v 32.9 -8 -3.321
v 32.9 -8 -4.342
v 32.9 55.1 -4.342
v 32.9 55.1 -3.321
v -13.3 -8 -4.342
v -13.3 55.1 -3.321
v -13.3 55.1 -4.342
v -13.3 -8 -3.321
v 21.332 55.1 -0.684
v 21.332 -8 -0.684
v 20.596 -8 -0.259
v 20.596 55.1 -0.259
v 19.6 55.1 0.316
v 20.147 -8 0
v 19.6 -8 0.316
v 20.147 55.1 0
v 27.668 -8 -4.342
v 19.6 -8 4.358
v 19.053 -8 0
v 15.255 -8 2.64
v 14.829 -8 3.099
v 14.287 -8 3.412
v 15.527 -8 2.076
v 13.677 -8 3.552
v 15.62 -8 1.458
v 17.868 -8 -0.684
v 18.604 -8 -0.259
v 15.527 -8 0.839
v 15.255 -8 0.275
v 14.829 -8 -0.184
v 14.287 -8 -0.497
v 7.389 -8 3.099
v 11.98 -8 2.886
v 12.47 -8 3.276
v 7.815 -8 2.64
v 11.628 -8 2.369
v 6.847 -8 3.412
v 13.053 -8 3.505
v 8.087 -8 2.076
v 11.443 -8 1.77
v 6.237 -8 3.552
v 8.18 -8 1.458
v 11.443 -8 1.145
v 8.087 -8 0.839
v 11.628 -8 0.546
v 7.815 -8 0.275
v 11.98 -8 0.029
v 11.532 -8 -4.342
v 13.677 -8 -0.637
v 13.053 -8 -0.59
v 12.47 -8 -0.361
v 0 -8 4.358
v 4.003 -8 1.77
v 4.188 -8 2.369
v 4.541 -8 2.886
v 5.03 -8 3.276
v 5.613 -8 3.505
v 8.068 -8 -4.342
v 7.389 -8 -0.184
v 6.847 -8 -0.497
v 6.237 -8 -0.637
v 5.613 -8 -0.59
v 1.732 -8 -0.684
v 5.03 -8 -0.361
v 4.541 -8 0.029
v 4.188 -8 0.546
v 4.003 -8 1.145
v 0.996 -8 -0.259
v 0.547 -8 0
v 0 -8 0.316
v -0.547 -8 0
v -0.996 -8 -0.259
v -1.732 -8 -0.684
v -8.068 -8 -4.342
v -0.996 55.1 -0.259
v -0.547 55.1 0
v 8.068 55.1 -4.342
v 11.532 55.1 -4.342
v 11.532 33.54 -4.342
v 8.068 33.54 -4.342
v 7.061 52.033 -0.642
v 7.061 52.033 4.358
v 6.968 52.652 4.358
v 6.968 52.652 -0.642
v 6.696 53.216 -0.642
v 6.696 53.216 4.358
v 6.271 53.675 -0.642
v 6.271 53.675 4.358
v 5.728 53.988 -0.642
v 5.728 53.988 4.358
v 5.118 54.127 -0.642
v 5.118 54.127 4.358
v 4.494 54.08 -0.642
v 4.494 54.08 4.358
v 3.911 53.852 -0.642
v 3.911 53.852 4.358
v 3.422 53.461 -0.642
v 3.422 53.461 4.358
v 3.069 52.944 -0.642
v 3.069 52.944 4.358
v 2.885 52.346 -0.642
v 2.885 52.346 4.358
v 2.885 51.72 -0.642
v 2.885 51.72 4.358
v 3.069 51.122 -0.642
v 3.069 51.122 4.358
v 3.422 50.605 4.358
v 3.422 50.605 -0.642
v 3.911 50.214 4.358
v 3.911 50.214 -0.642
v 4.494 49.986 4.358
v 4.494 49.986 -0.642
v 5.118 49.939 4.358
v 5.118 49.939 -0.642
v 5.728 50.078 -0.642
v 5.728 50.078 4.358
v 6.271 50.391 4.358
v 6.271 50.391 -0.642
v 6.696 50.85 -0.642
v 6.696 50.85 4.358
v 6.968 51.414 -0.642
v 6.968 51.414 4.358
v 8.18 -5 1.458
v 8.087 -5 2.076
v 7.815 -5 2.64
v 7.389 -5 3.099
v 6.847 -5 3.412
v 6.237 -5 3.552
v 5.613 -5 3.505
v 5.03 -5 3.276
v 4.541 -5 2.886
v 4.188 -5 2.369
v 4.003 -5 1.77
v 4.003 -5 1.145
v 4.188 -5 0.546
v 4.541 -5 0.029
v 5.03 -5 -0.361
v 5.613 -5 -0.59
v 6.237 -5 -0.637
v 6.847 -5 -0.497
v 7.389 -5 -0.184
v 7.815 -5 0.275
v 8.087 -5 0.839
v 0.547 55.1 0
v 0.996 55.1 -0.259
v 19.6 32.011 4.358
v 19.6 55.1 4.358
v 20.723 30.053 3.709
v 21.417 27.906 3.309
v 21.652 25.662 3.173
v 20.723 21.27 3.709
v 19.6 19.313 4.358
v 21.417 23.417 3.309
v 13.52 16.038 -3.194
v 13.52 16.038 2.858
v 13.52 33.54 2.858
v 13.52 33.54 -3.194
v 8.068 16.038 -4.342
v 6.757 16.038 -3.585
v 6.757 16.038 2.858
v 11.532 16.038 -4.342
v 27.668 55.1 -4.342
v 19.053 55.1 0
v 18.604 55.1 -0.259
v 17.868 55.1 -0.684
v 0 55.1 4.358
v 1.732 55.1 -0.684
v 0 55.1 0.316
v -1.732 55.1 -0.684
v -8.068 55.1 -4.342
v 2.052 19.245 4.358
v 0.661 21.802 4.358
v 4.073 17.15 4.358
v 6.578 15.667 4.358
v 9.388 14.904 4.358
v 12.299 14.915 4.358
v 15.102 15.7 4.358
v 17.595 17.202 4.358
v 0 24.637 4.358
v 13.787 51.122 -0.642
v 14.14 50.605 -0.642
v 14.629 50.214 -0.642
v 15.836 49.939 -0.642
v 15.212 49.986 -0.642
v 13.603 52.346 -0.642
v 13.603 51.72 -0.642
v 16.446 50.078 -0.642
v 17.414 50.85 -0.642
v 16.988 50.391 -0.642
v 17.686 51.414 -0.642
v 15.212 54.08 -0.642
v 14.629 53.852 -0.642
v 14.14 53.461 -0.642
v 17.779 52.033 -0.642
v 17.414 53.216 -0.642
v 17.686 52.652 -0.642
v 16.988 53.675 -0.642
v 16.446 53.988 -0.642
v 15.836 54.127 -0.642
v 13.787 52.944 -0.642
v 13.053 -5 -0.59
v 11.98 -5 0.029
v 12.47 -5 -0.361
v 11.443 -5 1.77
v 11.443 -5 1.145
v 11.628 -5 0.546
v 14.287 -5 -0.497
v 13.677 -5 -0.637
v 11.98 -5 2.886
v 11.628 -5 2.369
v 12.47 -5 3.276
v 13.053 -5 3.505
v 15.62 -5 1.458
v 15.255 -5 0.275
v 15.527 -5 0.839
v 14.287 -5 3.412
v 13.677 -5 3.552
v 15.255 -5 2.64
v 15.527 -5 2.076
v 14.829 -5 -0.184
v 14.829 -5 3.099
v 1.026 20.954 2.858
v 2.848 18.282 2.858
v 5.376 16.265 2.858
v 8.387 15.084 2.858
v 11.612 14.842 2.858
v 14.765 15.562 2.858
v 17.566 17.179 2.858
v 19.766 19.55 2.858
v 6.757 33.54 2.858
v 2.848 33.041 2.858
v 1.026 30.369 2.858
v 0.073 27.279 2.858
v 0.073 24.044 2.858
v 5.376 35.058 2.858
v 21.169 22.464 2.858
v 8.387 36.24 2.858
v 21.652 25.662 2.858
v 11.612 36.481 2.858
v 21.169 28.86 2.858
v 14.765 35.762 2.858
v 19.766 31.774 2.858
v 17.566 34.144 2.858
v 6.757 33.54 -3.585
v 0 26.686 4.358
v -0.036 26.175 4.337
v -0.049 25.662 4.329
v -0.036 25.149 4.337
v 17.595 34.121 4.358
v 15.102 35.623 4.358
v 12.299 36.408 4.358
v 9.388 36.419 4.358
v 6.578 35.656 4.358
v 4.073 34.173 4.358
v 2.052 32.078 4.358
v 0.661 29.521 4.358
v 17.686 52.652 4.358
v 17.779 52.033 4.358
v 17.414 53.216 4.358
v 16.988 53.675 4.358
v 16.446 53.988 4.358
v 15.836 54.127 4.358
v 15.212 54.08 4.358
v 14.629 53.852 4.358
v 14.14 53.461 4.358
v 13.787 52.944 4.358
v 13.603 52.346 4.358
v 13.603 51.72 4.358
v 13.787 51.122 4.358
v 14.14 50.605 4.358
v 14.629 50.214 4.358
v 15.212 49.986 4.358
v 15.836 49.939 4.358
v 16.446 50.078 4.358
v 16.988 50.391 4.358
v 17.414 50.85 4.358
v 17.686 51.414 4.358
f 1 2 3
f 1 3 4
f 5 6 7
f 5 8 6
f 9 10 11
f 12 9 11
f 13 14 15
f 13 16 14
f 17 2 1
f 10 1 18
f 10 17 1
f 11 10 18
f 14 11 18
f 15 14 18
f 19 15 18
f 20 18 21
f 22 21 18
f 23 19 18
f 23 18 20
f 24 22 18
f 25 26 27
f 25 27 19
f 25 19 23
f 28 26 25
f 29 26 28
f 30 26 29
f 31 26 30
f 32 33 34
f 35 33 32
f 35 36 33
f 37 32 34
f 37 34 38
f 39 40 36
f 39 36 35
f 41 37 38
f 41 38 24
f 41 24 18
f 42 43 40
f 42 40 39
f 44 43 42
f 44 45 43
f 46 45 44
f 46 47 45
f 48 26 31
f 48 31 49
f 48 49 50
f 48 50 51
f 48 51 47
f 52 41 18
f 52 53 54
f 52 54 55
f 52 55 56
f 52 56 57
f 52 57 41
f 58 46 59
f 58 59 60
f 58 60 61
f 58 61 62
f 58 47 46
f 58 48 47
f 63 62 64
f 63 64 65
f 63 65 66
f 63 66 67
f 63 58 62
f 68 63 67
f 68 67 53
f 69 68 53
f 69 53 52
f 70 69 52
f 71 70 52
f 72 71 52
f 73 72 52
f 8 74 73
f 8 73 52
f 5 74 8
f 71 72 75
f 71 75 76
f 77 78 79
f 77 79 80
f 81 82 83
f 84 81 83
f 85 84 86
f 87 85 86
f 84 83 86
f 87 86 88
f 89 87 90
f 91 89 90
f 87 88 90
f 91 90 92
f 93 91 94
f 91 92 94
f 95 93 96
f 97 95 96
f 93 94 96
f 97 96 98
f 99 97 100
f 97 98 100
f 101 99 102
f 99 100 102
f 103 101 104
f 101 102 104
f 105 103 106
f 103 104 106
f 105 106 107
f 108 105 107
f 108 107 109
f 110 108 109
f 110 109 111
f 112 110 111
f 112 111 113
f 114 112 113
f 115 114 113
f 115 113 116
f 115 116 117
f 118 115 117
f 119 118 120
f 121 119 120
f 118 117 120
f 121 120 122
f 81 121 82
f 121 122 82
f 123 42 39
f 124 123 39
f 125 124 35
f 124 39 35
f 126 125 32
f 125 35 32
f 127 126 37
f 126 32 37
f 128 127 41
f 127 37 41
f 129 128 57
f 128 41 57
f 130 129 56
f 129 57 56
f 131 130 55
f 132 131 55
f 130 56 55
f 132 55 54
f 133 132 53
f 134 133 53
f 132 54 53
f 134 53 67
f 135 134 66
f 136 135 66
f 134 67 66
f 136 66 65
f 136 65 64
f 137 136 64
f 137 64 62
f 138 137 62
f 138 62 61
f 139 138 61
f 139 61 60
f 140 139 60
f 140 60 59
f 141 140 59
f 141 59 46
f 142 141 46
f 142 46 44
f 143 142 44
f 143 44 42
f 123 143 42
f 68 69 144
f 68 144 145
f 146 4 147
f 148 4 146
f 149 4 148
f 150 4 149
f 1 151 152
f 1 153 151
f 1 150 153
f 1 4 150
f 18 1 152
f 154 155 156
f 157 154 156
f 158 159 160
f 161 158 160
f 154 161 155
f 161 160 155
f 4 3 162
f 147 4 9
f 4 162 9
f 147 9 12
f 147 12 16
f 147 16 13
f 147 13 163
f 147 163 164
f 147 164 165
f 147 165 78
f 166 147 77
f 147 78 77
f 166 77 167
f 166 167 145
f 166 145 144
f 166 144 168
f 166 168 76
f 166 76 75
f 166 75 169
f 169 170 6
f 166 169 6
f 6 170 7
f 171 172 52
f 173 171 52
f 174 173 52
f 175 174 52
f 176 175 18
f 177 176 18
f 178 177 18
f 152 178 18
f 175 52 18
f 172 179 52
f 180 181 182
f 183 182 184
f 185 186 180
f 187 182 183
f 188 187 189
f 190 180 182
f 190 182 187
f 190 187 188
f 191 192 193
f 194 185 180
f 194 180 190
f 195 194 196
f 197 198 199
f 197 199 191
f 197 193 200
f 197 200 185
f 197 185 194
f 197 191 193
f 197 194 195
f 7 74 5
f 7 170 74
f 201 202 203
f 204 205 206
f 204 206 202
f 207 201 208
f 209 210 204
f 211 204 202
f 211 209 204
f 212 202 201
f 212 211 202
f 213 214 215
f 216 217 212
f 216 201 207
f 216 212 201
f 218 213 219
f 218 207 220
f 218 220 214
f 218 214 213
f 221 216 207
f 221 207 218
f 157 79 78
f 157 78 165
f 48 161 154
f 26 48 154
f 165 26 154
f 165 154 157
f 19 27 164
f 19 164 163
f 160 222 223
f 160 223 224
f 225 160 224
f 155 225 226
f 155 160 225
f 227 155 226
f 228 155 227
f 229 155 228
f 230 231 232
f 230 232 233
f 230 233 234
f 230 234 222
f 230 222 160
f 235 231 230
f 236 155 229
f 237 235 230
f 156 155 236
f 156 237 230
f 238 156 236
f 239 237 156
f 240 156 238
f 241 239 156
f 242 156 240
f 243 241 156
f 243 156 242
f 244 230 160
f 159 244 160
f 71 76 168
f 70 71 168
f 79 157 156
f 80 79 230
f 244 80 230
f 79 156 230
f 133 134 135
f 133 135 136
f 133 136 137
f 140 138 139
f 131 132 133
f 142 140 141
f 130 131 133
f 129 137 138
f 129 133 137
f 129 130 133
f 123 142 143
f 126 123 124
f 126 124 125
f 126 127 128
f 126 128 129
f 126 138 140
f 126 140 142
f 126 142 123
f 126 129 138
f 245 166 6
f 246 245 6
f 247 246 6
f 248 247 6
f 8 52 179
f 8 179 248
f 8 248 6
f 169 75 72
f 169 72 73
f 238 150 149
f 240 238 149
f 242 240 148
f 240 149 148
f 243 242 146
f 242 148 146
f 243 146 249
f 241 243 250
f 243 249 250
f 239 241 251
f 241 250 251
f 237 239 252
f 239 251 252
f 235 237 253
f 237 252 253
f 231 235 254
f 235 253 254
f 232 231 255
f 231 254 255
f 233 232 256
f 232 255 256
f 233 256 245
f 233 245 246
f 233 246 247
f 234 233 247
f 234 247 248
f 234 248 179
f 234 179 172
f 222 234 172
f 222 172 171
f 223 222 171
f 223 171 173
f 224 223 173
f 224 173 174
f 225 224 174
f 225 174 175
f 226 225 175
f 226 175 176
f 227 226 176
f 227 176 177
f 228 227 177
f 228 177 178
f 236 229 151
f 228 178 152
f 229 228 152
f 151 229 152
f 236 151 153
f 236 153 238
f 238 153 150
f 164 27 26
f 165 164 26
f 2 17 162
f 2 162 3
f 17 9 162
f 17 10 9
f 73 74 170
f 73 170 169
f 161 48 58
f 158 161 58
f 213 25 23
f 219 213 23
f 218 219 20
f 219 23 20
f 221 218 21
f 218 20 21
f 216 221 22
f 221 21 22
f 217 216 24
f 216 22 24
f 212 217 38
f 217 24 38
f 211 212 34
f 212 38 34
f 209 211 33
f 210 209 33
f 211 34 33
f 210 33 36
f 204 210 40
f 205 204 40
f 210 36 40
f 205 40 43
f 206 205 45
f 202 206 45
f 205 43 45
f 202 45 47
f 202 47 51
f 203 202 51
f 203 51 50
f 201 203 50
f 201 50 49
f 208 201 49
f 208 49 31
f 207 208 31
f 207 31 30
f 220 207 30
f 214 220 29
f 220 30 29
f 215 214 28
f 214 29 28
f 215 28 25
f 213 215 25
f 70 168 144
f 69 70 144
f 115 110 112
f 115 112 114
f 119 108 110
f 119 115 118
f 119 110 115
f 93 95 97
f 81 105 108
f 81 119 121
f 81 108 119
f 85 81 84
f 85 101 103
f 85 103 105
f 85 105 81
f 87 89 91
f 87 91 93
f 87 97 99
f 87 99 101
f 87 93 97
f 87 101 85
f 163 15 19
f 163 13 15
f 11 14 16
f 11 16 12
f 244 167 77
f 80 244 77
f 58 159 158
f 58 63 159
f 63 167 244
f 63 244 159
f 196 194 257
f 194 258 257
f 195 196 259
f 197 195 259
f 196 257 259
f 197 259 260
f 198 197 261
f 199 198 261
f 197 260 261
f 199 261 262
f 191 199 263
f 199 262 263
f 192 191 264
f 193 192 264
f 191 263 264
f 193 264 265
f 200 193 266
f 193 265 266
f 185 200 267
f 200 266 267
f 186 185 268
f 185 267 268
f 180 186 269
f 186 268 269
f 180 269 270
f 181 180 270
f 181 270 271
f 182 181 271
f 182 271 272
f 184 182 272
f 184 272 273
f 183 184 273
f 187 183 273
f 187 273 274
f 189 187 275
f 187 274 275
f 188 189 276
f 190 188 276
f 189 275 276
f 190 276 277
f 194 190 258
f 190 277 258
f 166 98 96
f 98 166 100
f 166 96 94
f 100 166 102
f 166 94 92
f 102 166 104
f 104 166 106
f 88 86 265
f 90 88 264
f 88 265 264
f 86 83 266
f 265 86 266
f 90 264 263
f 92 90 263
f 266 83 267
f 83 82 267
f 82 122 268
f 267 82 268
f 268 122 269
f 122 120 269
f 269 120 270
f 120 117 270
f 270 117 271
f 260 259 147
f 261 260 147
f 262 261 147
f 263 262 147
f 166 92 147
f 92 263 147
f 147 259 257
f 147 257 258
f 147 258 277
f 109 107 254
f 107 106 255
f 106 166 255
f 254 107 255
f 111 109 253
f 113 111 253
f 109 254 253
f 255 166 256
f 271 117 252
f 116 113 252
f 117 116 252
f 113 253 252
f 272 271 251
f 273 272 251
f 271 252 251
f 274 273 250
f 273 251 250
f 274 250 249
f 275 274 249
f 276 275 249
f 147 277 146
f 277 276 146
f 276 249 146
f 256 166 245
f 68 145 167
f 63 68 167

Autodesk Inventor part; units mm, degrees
ref_plane "YZ Plane" through (0, 0, 0) normal (1, 0, 0) x (0, 1, 0)
ref_plane "XZ Plane" through (0, 0, 0) normal (0, 1, 0) x (-1, 0, 0)
ref_plane "РабПлоскость1" through (19.6, -8, -11) normal (0, -1, 0) x (-1, 0, 0)
sketch "Эскиз1" plane through (19.6, -8, -11) normal (0, -1, 0) x (-1, 0, 0)
  line L0 (29.4, -5.9741) -> (29.4, 5.9741) projected
  line L1 (28.2551, 5.9741) -> (29.4, 5.9741) projected
  line L2 (28.65, 6.658) -> (28.2551, 5.9741) projected
  line L3 (27.6679, 6.658) -> (28.65, 6.658) projected
  line L4 (21.3321, 10.3161) -> (27.6679, 6.658) projected
  line L5 (21.3321, 10.3161) -> (20.35, 10.3161) projected
  line L6 (20.35, 10.3161) -> (20.5955, 10.7413) projected
  line L7 (20.1474, 11) -> (20.5955, 10.7413) projected
  line L8 (20.1474, 11) -> (19.0526, 11) projected
  line L9 (18.6045, 10.7413) -> (19.0526, 11) projected
  line L10 (18.85, 10.3161) -> (18.6045, 10.7413) projected
  line L11 (17.8679, 10.3161) -> (18.85, 10.3161) projected
  line L12 (11.5321, 6.658) -> (17.8679, 10.3161) projected
  line L13 (11.5321, 6.658) -> (10.55, 6.658) projected
  line L14 (10.55, 6.658) -> (10.9449, 5.9741) projected
  line L15 (8.6551, 5.9741) -> (10.9449, 5.9741) projected
  line L16 (9.05, 6.658) -> (8.6551, 5.9741) projected
  line L17 (8.0679, 6.658) -> (9.05, 6.658) projected
  line L18 (1.7321, 10.3161) -> (8.0679, 6.658) projected
  line L19 (1.7321, 10.3161) -> (0.75, 10.3161) projected
  line L20 (0.75, 10.3161) -> (0.9955, 10.7413) projected
  line L21 (0.5474, 11) -> (0.9955, 10.7413) projected
  line L22 (-0.5474, 11) -> (0.5474, 11) projected
  line L23 (-0.9955, 10.7413) -> (-0.5474, 11) projected
  line L24 (-0.75, 10.3161) -> (-0.9955, 10.7413) projected
  line L25 (-1.7321, 10.3161) -> (-0.75, 10.3161) projected
  line L26 (-8.0679, 6.658) -> (-1.7321, 10.3161) projected
  line L27 (-8.0679, 6.658) -> (-9.05, 6.658) projected
  line L28 (-9.05, 6.658) -> (-8.6551, 5.9741) projected
  line L29 (-8.6551, 5.9741) -> (-9.8, 5.9741) projected
  line L30 (-9.8, -5.9741) -> (-9.8, 5.9741) projected
  line L31 (-8.6551, -5.9741) -> (-9.8, -5.9741) projected
  line L32 (-9.05, -6.658) -> (-8.6551, -5.9741) projected
  line L33 (-8.0679, -6.658) -> (-9.05, -6.658) projected
  line L34 (-1.7321, -10.3161) -> (-8.0679, -6.658) projected
  line L35 (-1.7321, -10.3161) -> (-0.75, -10.3161) projected
  line L36 (-0.75, -10.3161) -> (-0.9955, -10.7413) projected
  line L37 (-0.5474, -11) -> (-0.9955, -10.7413) projected
  line L38 (-0.5474, -11) -> (0.5474, -11) projected
  line L39 (0.9955, -10.7413) -> (0.5474, -11) projected
  line L40 (0.75, -10.3161) -> (0.9955, -10.7413) projected
  line L41 (1.7321, -10.3161) -> (0.75, -10.3161) projected
  line L42 (8.0679, -6.658) -> (1.7321, -10.3161) projected
  line L43 (8.0679, -6.658) -> (9.05, -6.658) projected
  line L44 (9.05, -6.658) -> (8.6551, -5.9741) projected
  line L45 (8.6551, -5.9741) -> (10.9449, -5.9741) projected
  line L46 (10.55, -6.658) -> (10.9449, -5.9741) projected
  line L47 (11.5321, -6.658) -> (10.55, -6.658) projected
  line L48 (17.8679, -10.3161) -> (11.5321, -6.658) projected
  line L49 (17.8679, -10.3161) -> (18.85, -10.3161) projected
  line L50 (18.85, -10.3161) -> (18.6045, -10.7413) projected
  line L51 (19.0526, -11) -> (18.6045, -10.7413) projected
  line L52 (19.0526, -11) -> (20.1474, -11) projected
  line L53 (20.5955, -10.7413) -> (20.1474, -11) projected
  line L54 (20.35, -10.3161) -> (20.5955, -10.7413) projected
  line L55 (21.3321, -10.3161) -> (20.35, -10.3161) projected
  line L56 (27.6679, -6.658) -> (21.3321, -10.3161) projected
  line L57 (27.6679, -6.658) -> (28.65, -6.658) projected
  line L58 (28.65, -6.658) -> (28.2551, -5.9741) projected
  line L59 (28.2551, -5.9741) -> (29.4, -5.9741) projected
  circle A0 centre (0, 0) radius 8.1 projected
  circle A1 centre (19.6, 0) radius 8.1 projected
  line L60 (32.9, 3.6373) -> (42.7, 9.2953) projected
  line L61 (42.7, 9.2953) -> (42.7, 24.6529) projected
  line L62 (42.7, 24.6529) -> (29.4, 32.3316) projected
  line L63 (29.4, 32.3316) -> (19.6, 26.6736) projected
  line L64 (19.6, 26.6736) -> (9.8, 32.3316) projected
  line L65 (9.8, 32.3316) -> (0, 26.6736) projected
  line L66 (0, 26.6736) -> (-9.8, 32.3316) projected
  line L67 (-9.8, 32.3316) -> (-23.1, 24.6529) projected
  line L68 (-23.1, 24.6529) -> (-23.1, 9.2953) projected
  line L69 (-23.1, 9.2953) -> (-13.3, 3.6373) projected
  line L70 (-13.3, 3.6373) -> (-13.3, -7.6788) projected
  line L71 (29.4, -5.9741) -> (28.2551, -5.9741) projected
  line L72 (28.2551, -5.9741) -> (28.65, -6.658) projected
  line L73 (28.65, -6.658) -> (27.6679, -6.658) projected
  line L74 (27.6679, -6.658) -> (21.3321, -10.3161) projected
  line L75 (17.8679, -10.3161) -> (11.5321, -6.658) projected
  line L76 (11.5321, -6.658) -> (10.55, -6.658) projected
  line L77 (10.55, -6.658) -> (10.9449, -5.9741) projected
  line L78 (10.9449, -5.9741) -> (8.6551, -5.9741) projected
  line L79 (8.6551, -5.9741) -> (9.05, -6.658) projected
  line L80 (9.05, -6.658) -> (8.0679, -6.658) projected
  line L81 (8.0679, -6.658) -> (1.7321, -10.3161) projected
  line L82 (-1.7321, -10.3161) -> (-8.0679, -6.658) projected
  line L83 (-8.0679, -6.658) -> (-9.05, -6.658) projected
  line L84 (-9.05, -6.658) -> (-8.6551, -5.9741) projected
  line L85 (-8.6551, -5.9741) -> (-9.8, -5.9741) projected
  line L86 (-9.8, -5.9741) -> (-9.8, 5.9741) projected
  line L87 (-9.8, 5.9741) -> (-10.3474, 5.9741) projected
  line L88 (-10.3474, 5.9741) -> (-10.7955, 6.2328) projected
  line L89 (-10.7955, 6.2328) -> (-10.55, 6.658) projected
  line L90 (-10.55, 6.658) -> (-11.5321, 6.658) projected
  line L91 (-11.5321, 6.658) -> (-17.8679, 10.3161) projected
  line L92 (-17.8679, 10.3161) -> (-18.85, 10.3161) projected
  line L93 (-18.85, 10.3161) -> (-18.4551, 11) projected
  line L94 (-18.4551, 11) -> (-19.6, 11) projected
  line L95 (-19.6, 11) -> (-19.6, 22.9482) projected
  line L96 (-19.6, 22.9482) -> (-18.4551, 22.9482) projected
  line L97 (-18.4551, 22.9482) -> (-18.85, 23.6321) projected
  line L98 (-18.85, 23.6321) -> (-17.8679, 23.6321) projected
  line L99 (-17.8679, 23.6321) -> (-11.5321, 27.2902) projected
  line L100 (-11.5321, 27.2902) -> (-10.55, 27.2902) projected
  line L101 (-10.55, 27.2902) -> (-10.7955, 27.7154) projected
  line L102 (-10.7955, 27.7154) -> (-10.3474, 27.9741) projected
  line L103 (-10.3474, 27.9741) -> (-9.2526, 27.9741) projected
  line L104 (-9.2526, 27.9741) -> (-8.8045, 27.7154) projected
  line L105 (-8.8045, 27.7154) -> (-9.05, 27.2902) projected
  line L106 (-9.05, 27.2902) -> (-8.0679, 27.2902) projected
  line L107 (-8.0679, 27.2902) -> (-1.7321, 23.6321) projected
  line L108 (-1.7321, 23.6321) -> (-0.75, 23.6321) projected
  line L109 (-0.75, 23.6321) -> (-1.1449, 22.9482) projected
  line L110 (-1.1449, 22.9482) -> (1.1449, 22.9482) projected
  line L111 (1.1449, 22.9482) -> (0.75, 23.6321) projected
  line L112 (0.75, 23.6321) -> (1.7321, 23.6321) projected
  line L113 (1.7321, 23.6321) -> (8.0679, 27.2902) projected
  line L114 (8.0679, 27.2902) -> (9.05, 27.2902) projected
  line L115 (9.05, 27.2902) -> (8.8045, 27.7154) projected
  line L116 (8.8045, 27.7154) -> (9.2526, 27.9741) projected
  line L117 (9.2526, 27.9741) -> (10.3474, 27.9741) projected
  line L118 (10.3474, 27.9741) -> (10.7955, 27.7154) projected
  line L119 (10.7955, 27.7154) -> (10.55, 27.2902) projected
  line L120 (10.55, 27.2902) -> (11.5321, 27.2902) projected
  line L121 (11.5321, 27.2902) -> (17.8679, 23.6321) projected
  line L122 (17.8679, 23.6321) -> (18.85, 23.6321) projected
  line L123 (18.85, 23.6321) -> (18.4551, 22.9482) projected
  line L124 (18.4551, 22.9482) -> (20.7449, 22.9482) projected
  line L125 (20.7449, 22.9482) -> (20.35, 23.6321) projected
  line L126 (20.35, 23.6321) -> (21.3321, 23.6321) projected
  line L127 (21.3321, 23.6321) -> (27.6679, 27.2902) projected
  line L128 (27.6679, 27.2902) -> (28.65, 27.2902) projected
  line L129 (28.65, 27.2902) -> (28.4045, 27.7154) projected
  line L130 (28.4045, 27.7154) -> (28.8526, 27.9741) projected
  line L131 (28.8526, 27.9741) -> (29.9474, 27.9741) projected
  line L132 (29.9474, 27.9741) -> (30.3955, 27.7154) projected
  line L133 (30.3955, 27.7154) -> (30.15, 27.2902) projected
  line L134 (30.15, 27.2902) -> (31.1321, 27.2902) projected
  line L135 (31.1321, 27.2902) -> (37.4679, 23.6321) projected
  line L136 (37.4679, 23.6321) -> (38.45, 23.6321) projected
  line L137 (38.45, 23.6321) -> (38.0551, 22.9482) projected
  line L138 (38.0551, 22.9482) -> (39.2, 22.9482) projected
  line L139 (39.2, 22.9482) -> (39.2, 11) projected
  line L140 (39.2, 11) -> (38.0551, 11) projected
  line L141 (38.0551, 11) -> (38.45, 10.3161) projected
  line L142 (38.45, 10.3161) -> (37.4679, 10.3161) projected
  line L143 (37.4679, 10.3161) -> (31.1321, 6.658) projected
  line L144 (31.1321, 6.658) -> (30.15, 6.658) projected
  line L145 (30.15, 6.658) -> (30.3955, 6.2328) projected
  line L146 (30.3955, 6.2328) -> (29.9474, 5.9741) projected
  line L147 (29.9474, 5.9741) -> (29.4, 5.9741) projected
  line L148 (29.4, 5.9741) -> (29.4, -5.9741) projected
  line L149 (-13.3, -7.6788) -> (0, -15.3575) projected
  line L150 (0, -15.3575) -> (9.8, -9.6995) projected
  line L151 (9.8, -9.6995) -> (19.6, -15.3575) projected
  line L152 (19.6, -15.3575) -> (32.9, -7.6788) projected
  line L153 (32.9, -7.6788) -> (32.9, 3.6373) projected
  line L154 (21.3321, -10.3161) -> (20.35, -10.3161) projected
  line L155 (20.35, -10.3161) -> (20.5955, -10.7413) projected
  line L156 (20.5955, -10.7413) -> (20.1474, -11) projected
  line L157 (20.1474, -11) -> (19.0526, -11) projected
  line L158 (19.0526, -11) -> (18.6045, -10.7413) projected
  line L159 (18.6045, -10.7413) -> (18.85, -10.3161) projected
  line L160 (18.85, -10.3161) -> (17.8679, -10.3161) projected
  line L161 (1.7321, -10.3161) -> (0.75, -10.3161) projected
  line L162 (0.75, -10.3161) -> (0.9955, -10.7413) projected
  line L163 (0.9955, -10.7413) -> (0.5474, -11) projected
  line L164 (0.5474, -11) -> (-0.5474, -11) projected
  line L165 (-0.5474, -11) -> (-0.9955, -10.7413) projected
  line L166 (-0.9955, -10.7413) -> (-0.75, -10.3161) projected
  line L167 (-0.75, -10.3161) -> (-1.7321, -10.3161) projected
  line L168 (32.9, -5.9741) -> (29.4, -5.9741)
  line L169 (-9.8, -5.9741) -> (-13.3, -5.9741)
  line L170 (19.6, -15.3575) -> (0, -15.3575)
  point P0 (19.6, -11)
ref_plane "РабПлоскость2" through (-38.0502, 55.1, -60.2624) normal (0, -1, 0) x (1, 0, 0)
extrude "Выдавливание1" add sketch "Эскиз1" against normal up to surface (63.1 mm away) contours L168 L153 L152 L151 L150 L149 L70 L169 L31 L32 L33 L34 L35 L36 L37 L38 L39 L40 L41 L42 L43 L44 L45 L46 L47 L48 L49 L50 L51 L52 L53 L54 L55 L56 L57 L58 L59 | L170 L150 L151
sketch "Эскиз2" plane through (0, -8, 4.3575) normal (0, 0, 1) x (1, 0, 0)
  circle A0 centre (10.0964, 32.8819) radius 10.85 projected
  spline S0 degree 3 poles (1.2199, 29.8332) (1.2264, 29.8391) (1.2399, 29.8514) (1.2666, 29.8618) (1.2971, 29.8679) (1.3188, 29.8674) (1.3303, 29.8671) knots 0 0 0 0 0.219432 0.455746 0.710361 1 1 1 1 projected
  line L0 (1.3303, 29.8671) -> (4.8998, 29.6603) projected
  line L1 (4.8998, 29.6603) -> (4.9412, 30.3747) projected
  spline S1 degree 3 poles (4.9412, 30.3747) (4.9436, 30.3952) (4.948, 30.4343) (4.9731, 30.4645) (4.9851, 30.4789) knots 0 0 0 0 0.523055 1 1 1 1 projected
  spline S2 degree 3 poles (4.9851, 30.4789) (5.0002, 30.4888) (5.0301, 30.5084) (5.0658, 30.5096) (5.0835, 30.5102) knots 0 0 0 0 0.505194 1 1 1 1 projected
  spline S3 degree 3 poles (5.0835, 30.5102) (5.0953, 30.507) (5.1242, 30.4991) (5.1574, 30.4755) (5.186, 30.4505) (5.2006, 30.4236) (5.2097, 30.3936) (5.2095, 30.3722) (5.2093, 30.3609) knots 0 0 0 0 0.170693 0.418909 0.563896 0.700202 0.841955 1 1 1 1 projected
  line L2 (5.2093, 30.3609) -> (5.1108, 28.6607) projected
  spline S4 degree 3 poles (5.1108, 28.6607) (5.1075, 28.6439) (5.1004, 28.6081) (5.064, 28.5657) (5.0204, 28.5312) (4.985, 28.5283) (4.9686, 28.5269) knots 0 0 0 0 0.239185 0.507115 0.772399 1 1 1 1 projected
  spline S5 degree 3 poles (4.9686, 28.5269) (4.9527, 28.5298) (4.9195, 28.5357) (4.8843, 28.5622) (4.8611, 28.5897) (4.8491, 28.6156) (4.842, 28.6452) (4.8426, 28.6661) (4.8429, 28.6771) knots 0 0 0 0 0.219722 0.460095 0.585443 0.71296 0.849405 1 1 1 1 projected
  line L3 (4.8429, 28.6771) -> (4.8843, 29.3923) projected
  line L4 (4.8843, 29.3923) -> (1.3148, 29.5991) projected
  spline S6 degree 3 poles (1.3148, 29.5991) (1.2937, 29.6014) (1.254, 29.6057) (1.2233, 29.6311) (1.2089, 29.6431) knots 0 0 0 0 0.529822 1 1 1 1 projected
  spline S7 degree 3 poles (1.2089, 29.6431) (1.1996, 29.6574) (1.1802, 29.6872) (1.1802, 29.7228) (1.1802, 29.7414) knots 0 0 0 0 0.479535 1 1 1 1 projected
  spline S8 degree 3 poles (1.1802, 29.7414) (1.1812, 29.7464) (1.1836, 29.7582) (1.1913, 29.7787) (1.2037, 29.8042) (1.2142, 29.8229) (1.2199, 29.8332) knots 0 0 0 0 0.152278 0.360896 0.649123 1 1 1 1 projected
  line L5 (5.314, 32.1682) -> (5.2899, 31.752) projected
  spline S9 degree 3 poles (5.2899, 31.752) (5.2876, 31.7272) (5.2829, 31.6758) (5.2703, 31.5966) (5.2484, 31.514) (5.2231, 31.428) (5.1921, 31.3426) (5.1551, 31.2607) (5.1134, 31.1842) (5.0808, 31.137) (5.0647, 31.1138) knots 0 0 0 0 0.109156 0.226197 0.350912 0.483159 0.618823 0.74875 0.876439 1 1 1 1 projected
  spline S10 degree 3 poles (5.0647, 31.1138) (5.0604, 31.1082) (5.0508, 31.0957) (5.0277, 31.0797) (4.9933, 31.0643) (4.9651, 31.0584) (4.9487, 31.055) knots 0 0 0 0 0.157275 0.353812 0.623959 1 1 1 1 projected
  spline S11 degree 3 poles (4.9487, 31.055) (4.931, 31.0577) (4.8944, 31.0635) (4.8502, 31.0969) (4.8148, 31.1372) (4.811, 31.1704) (4.8092, 31.1857) knots 0 0 0 0 0.254223 0.52772 0.782584 1 1 1 1 projected
  line L6 (4.8092, 31.1857) -> (4.839, 31.2655) projected
  spline S12 degree 3 poles (4.839, 31.2655) (4.8649, 31.302) (4.9161, 31.3743) (4.9704, 31.4963) (5.009, 31.625) (5.0173, 31.7147) (5.0215, 31.76) knots 0 0 0 0 0.250207 0.496054 0.745305 1 1 1 1 projected
  line L7 (5.0215, 31.76) -> (5.0462, 32.1871) projected
  spline S13 degree 3 poles (5.0462, 32.1871) (5.0465, 32.2279) (5.047, 32.3069) (5.0221, 32.4217) (4.9727, 32.5253) (4.9041, 32.6172) (4.8204, 32.6936) (4.7258, 32.7518) (4.6219, 32.7904) (4.5485, 32.7982) (4.5113, 32.8021) knots 0 0 0 0 0.134588 0.260434 0.384536 0.51119 0.637382 0.756913 0.876544 1 1 1 1 projected
  line L8 (4.5113, 32.8021) -> (4.3969, 32.8004) projected
  line L9 (4.3969, 32.8004) -> (4.3418, 32.7918) projected
  line L10 (4.3418, 32.7918) -> (4.2895, 32.7747) projected
  spline S14 degree 3 poles (4.2895, 32.7747) (4.2759, 32.7681) (4.2464, 32.7539) (4.201, 32.7264) (4.1502, 32.6923) (4.1153, 32.6662) (4.0967, 32.6522) knots 0 0 0 0 0.198705 0.428492 0.695375 1 1 1 1 projected
  line L11 (4.0967, 32.6522) -> (2.7508, 31.4386) projected
  spline S15 degree 3 poles (2.7508, 31.4386) (2.7287, 31.4196) (2.6853, 31.3821) (2.6147, 31.3335) (2.5398, 31.2938) (2.4871, 31.2738) (2.4608, 31.2638) knots 0 0 0 0 0.25594 0.505009 0.752321 1 1 1 1 projected
  line L12 (2.4608, 31.2638) -> (2.3941, 31.2441) projected
  line L13 (2.3941, 31.2441) -> (2.2844, 31.2219) projected
  line L14 (2.2844, 31.2219) -> (2.2184, 31.214) projected
  line L15 (2.2184, 31.214) -> (2.1355, 31.2188) projected
  spline S16 degree 3 poles (2.1355, 31.2188) (2.1073, 31.221) (2.0518, 31.2253) (1.9706, 31.2414) (1.8929, 31.264) (1.8193, 31.2949) (1.7487, 31.3318) (1.6814, 31.3759) (1.6185, 31.428) (1.5798, 31.4669) (1.5603, 31.4866) knots 0 0 0 0 0.130274 0.256409 0.380833 0.502298 0.624003 0.747576 0.872087 1 1 1 1 projected
  spline S17 degree 3 poles (1.5603, 31.4866) (1.5403, 31.5086) (1.501, 31.552) (1.4514, 31.6239) (1.409, 31.6982) (1.3765, 31.777) (1.3515, 31.8588) (1.3368, 31.9447) (1.3286, 32.0337) (1.3307, 32.0942) (1.3317, 32.125) knots 0 0 0 0 0.127376 0.251339 0.373922 0.494219 0.616919 0.74041 0.867775 1 1 1 1 projected
  line L16 (1.3317, 32.125) -> (1.3558, 32.5404) projected
  spline S18 degree 3 poles (1.3558, 32.5404) (1.3581, 32.57) (1.3627, 32.6288) (1.3785, 32.7152) (1.3986, 32.7994) (1.4276, 32.8801) (1.4612, 32.9589) (1.503, 33.0341) (1.5498, 33.1077) (1.5861, 33.1534) (1.6044, 33.1765) knots 0 0 0 0 0.128087 0.254502 0.3786 0.501671 0.623923 0.748156 0.873068 1 1 1 1 projected
  line L17 (1.6044, 33.1765) -> (1.6608, 33.2219) projected
  line L18 (1.6608, 33.2219) -> (1.7278, 33.2323) projected
  spline S19 degree 3 poles (1.7278, 33.2323) (1.7436, 33.2293) (1.7788, 33.2226) (1.8172, 33.1955) (1.8457, 33.1692) (1.862, 33.1468) (1.8715, 33.123) (1.872, 33.1067) (1.8722, 33.0988) knots 0 0 0 0 0.225013 0.500357 0.645758 0.771988 0.888482 1 1 1 1 projected
  line L19 (1.8722, 33.0988) -> (1.8363, 33.0168) projected
  spline S20 degree 3 poles (1.8363, 33.0168) (1.8059, 32.9802) (1.7465, 32.909) (1.6822, 32.7873) (1.6385, 32.66) (1.6288, 32.5716) (1.6239, 32.5274) knots 0 0 0 0 0.262033 0.510647 0.755153 1 1 1 1 projected
  line L20 (1.6239, 32.5274) -> (1.5994, 32.1045) projected
  spline S21 degree 3 poles (1.5994, 32.1045) (1.5993, 32.0662) (1.5991, 31.9907) (1.6258, 31.8801) (1.6754, 31.7771) (1.7439, 31.6831) (1.827, 31.6017) (1.9225, 31.5408) (2.0268, 31.4999) (2.1004, 31.4917) (2.1376, 31.4876) knots 0 0 0 0 0.126552 0.249346 0.372878 0.503227 0.632635 0.755805 0.876214 1 1 1 1 projected
  line L21 (2.1376, 31.4876) -> (2.2344, 31.4904) projected
  spline S22 degree 3 poles (2.2344, 31.4904) (2.2424, 31.4911) (2.2593, 31.4927) (2.2852, 31.4995) (2.3126, 31.5062) (2.3305, 31.5129) (2.3393, 31.5162) knots 0 0 0 0 0.220277 0.47027 0.739664 1 1 1 1 projected
  spline S23 degree 3 poles (2.3393, 31.5162) (2.3561, 31.5216) (2.3912, 31.5327) (2.4427, 31.5592) (2.4967, 31.5921) (2.5308, 31.6198) (2.5487, 31.6344) knots 0 0 0 0 0.217508 0.45648 0.715095 1 1 1 1 projected
  line L22 (2.5487, 31.6344) -> (3.8947, 32.8496) projected
  spline S24 degree 3 poles (3.8947, 32.8496) (3.9135, 32.8658) (3.9528, 32.8998) (4.0224, 32.9431) (4.0991, 32.9892) (4.1556, 33.0157) (4.1849, 33.0295) knots 0 0 0 0 0.216591 0.454587 0.716038 1 1 1 1 projected
  spline S25 degree 3 poles (4.1849, 33.0295) (4.2113, 33.037) (4.2639, 33.0522) (4.3449, 33.067) (4.4272, 33.0731) (4.4823, 33.0718) (4.5101, 33.0711) knots 0 0 0 0 0.249589 0.498449 0.747622 1 1 1 1 projected
  spline S26 degree 3 poles (4.5101, 33.0711) (4.5383, 33.0689) (4.5938, 33.0646) (4.675, 33.0485) (4.7526, 33.0259) (4.8263, 32.995) (4.8966, 32.958) (4.9644, 32.915) (5.0271, 32.8627) (5.0658, 32.8238) (5.0853, 32.8042) knots 0 0 0 0 0.130358 0.256573 0.381077 0.50262 0.624402 0.747414 0.872005 1 1 1 1 projected
  spline S27 degree 3 poles (5.0853, 32.8042) (5.1053, 32.7822) (5.1447, 32.7388) (5.1939, 32.667) (5.2369, 32.5933) (5.2689, 32.5147) (5.2944, 32.4334) (5.3089, 32.3477) (5.317, 32.259) (5.3151, 32.1988) (5.314, 32.1682) knots 0 0 0 0 0.127803 0.252181 0.37416 0.49486 0.61684 0.740744 0.868535 1 1 1 1 projected
  spline S28 degree 3 poles (3.6331, 34.2513) (3.6171, 34.2541) (3.5836, 34.26) (3.549, 34.2875) (3.5256, 34.3149) (3.5136, 34.3409) (3.5065, 34.3704) (3.5071, 34.3913) (3.5074, 34.4023) knots 0 0 0 0 0.219271 0.461203 0.586294 0.713549 0.849714 1 1 1 1 projected
  line L23 (3.5074, 34.4023) -> (3.5487, 35.1167) projected
  line L24 (3.5487, 35.1167) -> (1.7799, 35.2192) projected
  line L25 (1.7799, 35.2192) -> (1.7054, 33.9336) projected
  spline S29 degree 3 poles (1.7054, 33.9336) (1.7021, 33.9168) (1.695, 33.8811) (1.6586, 33.8386) (1.6149, 33.8043) (1.5795, 33.8007) (1.5632, 33.799) knots 0 0 0 0 0.238964 0.506645 0.771683 1 1 1 1 projected
  spline S30 degree 3 poles (1.5632, 33.799) (1.5473, 33.8019) (1.514, 33.8078) (1.4789, 33.8343) (1.4556, 33.8618) (1.4436, 33.8877) (1.4366, 33.917) (1.4371, 33.9376) (1.4374, 33.9483) knots 0 0 0 0 0.220569 0.461868 0.587699 0.715707 0.852678 1 1 1 1 projected
  line L26 (1.4374, 33.9483) -> (1.5192, 35.3612) projected
  spline S31 degree 3 poles (1.5192, 35.3612) (1.5219, 35.3821) (1.5267, 35.4202) (1.5572, 35.4694) (1.6096, 35.494) (1.6479, 35.4943) (1.669, 35.4946) knots 0 0 0 0 0.274617 0.5 0.725383 1 1 1 1 projected
  line L27 (1.669, 35.4946) -> (5.3524, 35.2811) projected
  spline S32 degree 3 poles (5.3524, 35.2811) (5.3733, 35.2785) (5.4113, 35.2737) (5.4605, 35.2432) (5.4851, 35.1908) (5.4855, 35.1525) (5.4857, 35.1314) knots 0 0 0 0 0.274617 0.5 0.725383 1 1 1 1 projected
  line L28 (5.4857, 35.1314) -> (5.4039, 33.7185) projected
  spline S33 degree 3 poles (5.4039, 33.7185) (5.4005, 33.7017) (5.3934, 33.6659) (5.3571, 33.6235) (5.3134, 33.589) (5.278, 33.5861) (5.2617, 33.5847) knots 0 0 0 0 0.239185 0.507115 0.772399 1 1 1 1 projected
  spline S34 degree 3 poles (5.2617, 33.5847) (5.2457, 33.5875) (5.2122, 33.5934) (5.1776, 33.6208) (5.1542, 33.6483) (5.1422, 33.6742) (5.1352, 33.7035) (5.1356, 33.7242) (5.1359, 33.7349) knots 0 0 0 0 0.220114 0.462976 0.588548 0.716293 0.852982 1 1 1 1 projected
  line L29 (5.1359, 33.7349) -> (5.2104, 35.0205) projected
  line L30 (5.2104, 35.0205) -> (3.8168, 35.1012) projected
  line L31 (3.8168, 35.1012) -> (3.7754, 34.3868) projected
  spline S35 degree 3 poles (3.7754, 34.3868) (3.772, 34.3697) (3.7651, 34.3336) (3.7285, 34.2909) (3.6848, 34.2566) (3.6494, 34.253) (3.6331, 34.2513) knots 0 0 0 0 0.241893 0.508544 0.772562 1 1 1 1 projected
  spline S36 degree 3 poles (1.6423, 37.123) (1.6488, 37.1289) (1.6622, 37.1412) (1.689, 37.1516) (1.7195, 37.1577) (1.7411, 37.1572) (1.7527, 37.1569) knots 0 0 0 0 0.219432 0.455746 0.710361 1 1 1 1 projected
  line L32 (1.7527, 37.1569) -> (5.3222, 36.9501) projected
  line L33 (5.3222, 36.9501) -> (5.3636, 37.6645) projected
  spline S37 degree 3 poles (5.3636, 37.6645) (5.3659, 37.685) (5.3704, 37.7241) (5.3955, 37.7543) (5.4074, 37.7687) knots 0 0 0 0 0.523055 1 1 1 1 projected
  spline S38 degree 3 poles (5.4074, 37.7687) (5.4225, 37.7786) (5.4525, 37.7982) (5.4882, 37.7994) (5.5059, 37.8) knots 0 0 0 0 0.505194 1 1 1 1 projected
  spline S39 degree 3 poles (5.5059, 37.8) (5.5177, 37.7967) (5.5466, 37.7889) (5.5798, 37.7652) (5.6084, 37.7402) (5.623, 37.7134) (5.6321, 37.6834) (5.6318, 37.662) (5.6317, 37.6507) knots 0 0 0 0 0.170693 0.418909 0.563896 0.700202 0.841955 1 1 1 1 projected
  line L34 (5.6317, 37.6507) -> (5.5332, 35.9505) projected
  spline S40 degree 3 poles (5.5332, 35.9505) (5.5298, 35.9336) (5.5228, 35.8979) (5.4864, 35.8555) (5.4427, 35.8209) (5.4073, 35.8181) (5.391, 35.8167) knots 0 0 0 0 0.239185 0.507115 0.772399 1 1 1 1 projected
  spline S41 degree 3 poles (5.391, 35.8167) (5.3751, 35.8196) (5.3418, 35.8255) (5.3067, 35.852) (5.2834, 35.8795) (5.2714, 35.9054) (5.2644, 35.935) (5.2649, 35.9559) (5.2652, 35.9669) knots 0 0 0 0 0.219722 0.460095 0.585443 0.71296 0.849405 1 1 1 1 projected
  line L35 (5.2652, 35.9669) -> (5.3067, 36.6821) projected
  line L36 (5.3067, 36.6821) -> (1.7371, 36.8889) projected
  spline S42 degree 3 poles (1.7371, 36.8889) (1.7161, 36.8912) (1.6764, 36.8955) (1.6457, 36.9209) (1.6313, 36.9329) knots 0 0 0 0 0.529822 1 1 1 1 projected
  spline S43 degree 3 poles (1.6313, 36.9329) (1.622, 36.9472) (1.6025, 36.977) (1.6025, 37.0126) (1.6025, 37.0312) knots 0 0 0 0 0.479535 1 1 1 1 projected
  spline S44 degree 3 poles (1.6025, 37.0312) (1.6035, 37.0362) (1.606, 37.048) (1.6136, 37.0685) (1.6261, 37.094) (1.6366, 37.1127) (1.6423, 37.123) knots 0 0 0 0 0.152278 0.360896 0.649123 1 1 1 1 projected
  arc A1 (13.962, 34.3771) -> (13.7634, 30.9503) centre (10.0964, 32.8819) ccw projected
  line L37 (13.962, 34.3771) -> (13.2158, 34.0885) projected
  arc A2 (13.2158, 34.0885) -> (13.0556, 31.3231) centre (10.0964, 32.8819) ccw projected
  line L38 (13.0556, 31.3231) -> (13.7634, 30.9503) projected
  line L39 (14.9235, 33.0029) -> (12.2087, 33.1602) projected
  line L40 (14.9235, 33.0029) -> (14.8772, 32.2042) projected
  line L41 (14.8772, 32.2042) -> (12.1624, 32.3615) projected
  line L42 (12.1624, 32.3615) -> (12.2087, 33.1602) projected
  line L43 (13.5198, 41.5398) -> (6.7574, 41.5398)
  line L44 (6.7574, 41.5398) -> (6.7574, 24.0382)
  line L45 (6.7574, 24.0382) -> (13.5198, 24.0382)
  line L46 (13.5198, 24.0382) -> (13.5198, 41.5398)
  point P0 (0, 8)
extrude "Выдавливание2" cut sketch "Эскиз2" against normal blind 10 contours L46 L37 A2 L44 A1 | A1 L44 L43 L46 | L46 L39 L42 L41 L38 A2 L44 L37 | L46 L41 L42 L39 | L44 A2 L38 L46 A1 | A1 L46 L45 L44
sketch "Эскиз3" plane through (0, -8, 4.3575) normal (0, 0, 1) x (1, 0, 0)
  circle A0 centre (10.8015, 33.6616) radius 10.85 projected
  point P0 (0, 8)
extrude "Выдавливание3" cut sketch "Эскиз3" against normal blind 1.5
sketch "Эскиз4" plane through (0, 55.1, 4.3575) normal (0, 0, 1) x (1, 0, 0)
  point P0 (0, -55.1)
sketch "Эскиз5" plane through (0, 55.1, 4.3575) normal (0, 0, 1) x (1, 0, 0)
  ellipse E0 centre (15.6791, -3.0669) end of major axis (15.6791, -1.0669) minor radius 2 projected
  ellipse E1 centre (4.9612, -3.0669) end of major axis (4.9612, -1.0669) minor radius 2 projected
  circle A0 centre (15.6791, -3.0669) radius 2.1
  circle A1 centre (4.9612, -3.0669) radius 2.1
  point P0 (0, -55.1)
  dimension "d10" = 4.2
  dimension "d11" = 4.2
extrude "Выдавливание4" cut sketch "Эскиз5" against normal blind 5 contours E0 | E1 | A0 | A1
sketch "Эскиз6" plane through (0, 55.1, 4.3575) normal (0, 1, 0) x (1, 0, 0)
  line L0 (-8.6551, 9.3834) -> (-13.3, 9.3834) projected
  line L1 (-13.3, 9.3834) -> (-13.3, 7.6788) projected
  line L2 (-13.3, 7.6788) -> (0, 0) projected
  line L3 (0, 0) -> (19.6, 0) projected
  line L4 (19.6, 0) -> (32.9, 7.6788) projected
  line L5 (32.9, 7.6788) -> (32.9, 9.3834) projected
  line L6 (32.9, 9.3834) -> (28.2551, 9.3834) projected
  line L7 (28.2551, 9.3834) -> (28.65, 8.6995) projected
  line L8 (28.65, 8.6995) -> (27.6679, 8.6995) projected
  line L9 (27.6679, 8.6995) -> (21.3321, 5.0415) projected
  line L10 (21.3321, 5.0415) -> (20.35, 5.0415) projected
  line L11 (20.35, 5.0415) -> (20.5955, 4.6162) projected
  line L12 (20.5955, 4.6162) -> (20.1474, 4.3575) projected
  line L13 (20.1474, 4.3575) -> (19.0526, 4.3575) projected
  line L14 (19.0526, 4.3575) -> (18.6045, 4.6162) projected
  line L15 (18.6045, 4.6162) -> (18.85, 5.0415) projected
  line L16 (18.85, 5.0415) -> (17.8679, 5.0415) projected
  line L17 (17.8679, 5.0415) -> (11.5321, 8.6995) projected
  line L18 (11.5321, 8.6995) -> (10.55, 8.6995) projected
  line L19 (10.55, 8.6995) -> (10.9449, 9.3834) projected
  line L20 (10.9449, 9.3834) -> (8.6551, 9.3834) projected
  line L21 (8.6551, 9.3834) -> (9.05, 8.6995) projected
  line L22 (9.05, 8.6995) -> (8.0679, 8.6995) projected
  line L23 (8.0679, 8.6995) -> (1.7321, 5.0415) projected
  line L24 (1.7321, 5.0415) -> (0.75, 5.0415) projected
  line L25 (0.75, 5.0415) -> (0.9955, 4.6162) projected
  line L26 (0.9955, 4.6162) -> (0.5474, 4.3575) projected
  line L27 (0.5474, 4.3575) -> (-0.5474, 4.3575) projected
  line L28 (-0.5474, 4.3575) -> (-0.9955, 4.6162) projected
  line L29 (-0.9955, 4.6162) -> (-0.75, 5.0415) projected
  line L30 (-0.75, 5.0415) -> (-1.7321, 5.0415) projected
  line L31 (-1.7321, 5.0415) -> (-8.0679, 8.6995) projected
  line L32 (-8.0679, 8.6995) -> (-9.05, 8.6995) projected
  line L33 (-9.05, 8.6995) -> (-8.6551, 9.3834) projected
  circle A0 centre (0, 15.3575) radius 8.1 projected
  line L34 (-0.9955, 4.6162) -> (3.0148, 2.3009)
  line L35 (-0.9955, 4.6162) -> (-14.4085, 12.3602)
  line L36 (-1.543, 3.1506) -> (10.7474, 10.2465)
  line L37 (19.6, 4.0415) -> (9.8, 9.6995) projected
  line L38 (29.4, 9.6995) -> (19.6, 4.0415) projected
  line L39 (8.0679, 8.6995) -> (11.5321, 8.6995)
  line L40 (-9.05, 8.6995) -> (-13.3, 8.6995)
  line L41 (28.65, 8.6995) -> (32.9, 8.6995)
  point P0 (0, 4.3575)
  point P1 (10.55, 8.6995)
  point P2 (0.9955, 4.6162)
  point P3 (0, 4.0415)
extrude "Выдавливание5" cut sketch "Эскиз6" against normal up to surface (63.1 mm away) contours L33 L35 L0 | L35 L33 L40 L1 L0 | L30 L29 L35 | L27 L36 L34 | L25 L24 L36 | L41 L7 L38 L6 L5 | L38 L7 L6 | L21 L36 L20 L37 L19 L39 | L21 L20 L36 | L38 L11 L10 | L37 L20 L19 | L38 L37 L13 | L16 L15 L37
sketch "Эскиз7" plane through (19.6, -8, -11) normal (0, -1, 0) x (1, 0, 0)
  line L0 (-6.0802, 13.8575) -> (-6.0802, 7.8057) projected
  line L1 (-6.0802, 12.4575) -> (-18.1272, 12.4575)
  circle A0 centre (-6.0802, 12.4575) radius 2.1
  line L2 (-6.0209, 10.3575) -> (-1.8209, 10.3575) projected
  circle A1 centre (-13.52, 12.4575) radius 2.1
  line L3 (-11.5321, 6.658) -> (-8.0679, 6.658) projected
  point P0 (-19.6, 11)
  point P1 (-9.8, 6.658)
  dimension "d14" = 4.2
  dimension "d15" = 4.2
  dimension "d17" = 3.72
extrude "Выдавливание6" cut sketch "Эскиз7" against normal blind 3
properties part number "крепеж бок"
